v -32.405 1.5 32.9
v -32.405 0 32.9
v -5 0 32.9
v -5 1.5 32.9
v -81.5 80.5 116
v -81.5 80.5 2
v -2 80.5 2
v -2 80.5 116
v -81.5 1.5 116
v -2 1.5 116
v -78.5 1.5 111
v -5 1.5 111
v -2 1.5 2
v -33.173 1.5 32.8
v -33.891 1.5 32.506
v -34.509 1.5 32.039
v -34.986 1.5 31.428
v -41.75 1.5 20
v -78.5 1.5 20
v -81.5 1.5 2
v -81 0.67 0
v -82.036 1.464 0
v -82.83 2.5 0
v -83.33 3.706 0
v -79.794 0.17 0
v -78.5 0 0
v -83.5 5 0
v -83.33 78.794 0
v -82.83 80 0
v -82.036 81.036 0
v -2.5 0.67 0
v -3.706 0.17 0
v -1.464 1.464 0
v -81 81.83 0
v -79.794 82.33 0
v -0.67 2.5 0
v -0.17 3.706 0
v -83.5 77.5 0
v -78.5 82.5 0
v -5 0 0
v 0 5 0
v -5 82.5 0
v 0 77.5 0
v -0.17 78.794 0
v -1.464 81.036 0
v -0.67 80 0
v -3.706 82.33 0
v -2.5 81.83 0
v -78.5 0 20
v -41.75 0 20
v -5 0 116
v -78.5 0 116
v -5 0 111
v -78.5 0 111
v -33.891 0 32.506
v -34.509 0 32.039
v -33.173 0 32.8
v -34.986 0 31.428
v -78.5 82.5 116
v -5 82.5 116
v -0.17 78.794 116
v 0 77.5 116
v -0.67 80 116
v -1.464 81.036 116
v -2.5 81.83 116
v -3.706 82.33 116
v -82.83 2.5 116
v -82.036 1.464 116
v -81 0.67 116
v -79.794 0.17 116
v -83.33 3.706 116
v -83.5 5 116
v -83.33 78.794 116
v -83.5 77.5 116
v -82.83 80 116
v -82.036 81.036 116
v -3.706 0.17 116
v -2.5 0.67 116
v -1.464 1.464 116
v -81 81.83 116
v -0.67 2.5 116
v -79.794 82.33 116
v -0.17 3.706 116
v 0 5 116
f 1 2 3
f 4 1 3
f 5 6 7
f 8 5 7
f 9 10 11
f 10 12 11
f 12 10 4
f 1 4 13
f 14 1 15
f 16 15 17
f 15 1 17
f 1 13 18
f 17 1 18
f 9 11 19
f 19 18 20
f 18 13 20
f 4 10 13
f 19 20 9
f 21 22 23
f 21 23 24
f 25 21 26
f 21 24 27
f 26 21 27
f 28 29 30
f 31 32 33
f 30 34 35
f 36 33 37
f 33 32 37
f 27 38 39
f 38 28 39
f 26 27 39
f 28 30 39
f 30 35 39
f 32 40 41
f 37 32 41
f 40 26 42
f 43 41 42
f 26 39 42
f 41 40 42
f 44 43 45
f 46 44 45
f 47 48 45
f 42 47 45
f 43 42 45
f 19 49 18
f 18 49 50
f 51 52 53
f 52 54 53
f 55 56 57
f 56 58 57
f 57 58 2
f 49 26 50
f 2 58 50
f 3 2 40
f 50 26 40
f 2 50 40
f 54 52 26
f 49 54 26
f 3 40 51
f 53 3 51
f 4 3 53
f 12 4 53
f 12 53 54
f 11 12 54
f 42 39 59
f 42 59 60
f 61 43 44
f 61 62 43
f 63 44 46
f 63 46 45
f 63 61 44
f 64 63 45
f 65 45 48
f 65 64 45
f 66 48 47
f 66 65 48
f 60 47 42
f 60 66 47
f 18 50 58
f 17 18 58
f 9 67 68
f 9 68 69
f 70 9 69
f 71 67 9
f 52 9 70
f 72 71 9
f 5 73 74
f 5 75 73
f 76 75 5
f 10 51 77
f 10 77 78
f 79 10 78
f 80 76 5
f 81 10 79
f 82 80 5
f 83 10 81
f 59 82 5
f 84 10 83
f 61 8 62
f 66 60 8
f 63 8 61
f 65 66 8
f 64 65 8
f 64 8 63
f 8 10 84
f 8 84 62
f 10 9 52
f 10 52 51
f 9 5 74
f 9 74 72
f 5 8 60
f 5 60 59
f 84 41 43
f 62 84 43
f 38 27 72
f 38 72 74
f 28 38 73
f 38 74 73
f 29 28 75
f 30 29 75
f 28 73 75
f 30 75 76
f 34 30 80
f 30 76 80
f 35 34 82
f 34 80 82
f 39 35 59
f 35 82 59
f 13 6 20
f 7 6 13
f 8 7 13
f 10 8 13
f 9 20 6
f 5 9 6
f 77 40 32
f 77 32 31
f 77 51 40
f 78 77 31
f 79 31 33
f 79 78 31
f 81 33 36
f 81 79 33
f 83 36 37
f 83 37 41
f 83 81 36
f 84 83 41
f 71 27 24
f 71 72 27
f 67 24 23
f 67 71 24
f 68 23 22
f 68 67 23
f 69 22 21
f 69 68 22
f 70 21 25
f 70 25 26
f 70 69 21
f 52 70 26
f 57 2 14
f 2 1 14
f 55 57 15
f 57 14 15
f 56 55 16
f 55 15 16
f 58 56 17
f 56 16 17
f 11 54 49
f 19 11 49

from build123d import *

# Parameters (mm, degrees)
F0_W     = 83.5
F0_H     = 82.5
F1_DEPTH = 116
F3_DEPTH = 25
F4_R     = 3
F5_DEPTH = 2
F6_R     = 4.99999


# Not quite as in the source:
# - a fillet or chamfer is up to 0.001 mm smaller than in the source, because OpenCascade refuses the exact size


with BuildPart() as f1:
    # F0 (on Top) → F1 (new body)
    with BuildSketch(Plane.XY):
        with Locations((-41.75, 41.25)):
            Rectangle(F0_W, F0_H)
        Polygon((-2, 1.5), (-43.8047535717, 1.5), (-81.5, 1.5), (-81.5, 41.25), (-81.5, 80.5), (-41.75, 80.5), (-2, 80.5), (-2, 41.25), align=None, mode=Mode.SUBTRACT)
    extrude(amount=F1_DEPTH)

    # F2 (on Front) → F3 (cut)
    with BuildSketch(Plane.XZ):
        Polygon((-5, 111), (-78.5, 111), (-78.5, 20), (-41.75, 20), (-34.1152064502, 32.9003408551), (-5, 32.9003408551), align=None)
    extrude(amount=-F3_DEPTH, mode=Mode.SUBTRACT)

    # F4
    f4_edges = [f1.edges().sort_by_distance(p)[0] for p in [
        (-34.115206, 0.75, 32.900341),
    ]]
    fillet(f4_edges, radius=F4_R)

    # F0 (on Top) → F5 (join)
    with BuildSketch(Plane.XY):
        Polygon((-81.5, 1.5), (-43.8047535717, 1.5), (-2, 1.5), (-2, 41.25), (-2, 80.5), (-41.75, 80.5), (-81.5, 80.5), (-81.5, 41.25), align=None)
    extrude(amount=F5_DEPTH)

    # F6 (radius 5 in the source; OpenCascade refuses exactly that, so slightly less here)
    f6_edges = [f1.edges().sort_by_distance(p)[0] for p in [
        (-83.5, 0, 58),
        (0, 0, 58),
        (0, 82.5, 58),
        (-83.5, 82.5, 58),
    ]]
    fillet(f6_edges, radius=F6_R)


solid = f1.part
